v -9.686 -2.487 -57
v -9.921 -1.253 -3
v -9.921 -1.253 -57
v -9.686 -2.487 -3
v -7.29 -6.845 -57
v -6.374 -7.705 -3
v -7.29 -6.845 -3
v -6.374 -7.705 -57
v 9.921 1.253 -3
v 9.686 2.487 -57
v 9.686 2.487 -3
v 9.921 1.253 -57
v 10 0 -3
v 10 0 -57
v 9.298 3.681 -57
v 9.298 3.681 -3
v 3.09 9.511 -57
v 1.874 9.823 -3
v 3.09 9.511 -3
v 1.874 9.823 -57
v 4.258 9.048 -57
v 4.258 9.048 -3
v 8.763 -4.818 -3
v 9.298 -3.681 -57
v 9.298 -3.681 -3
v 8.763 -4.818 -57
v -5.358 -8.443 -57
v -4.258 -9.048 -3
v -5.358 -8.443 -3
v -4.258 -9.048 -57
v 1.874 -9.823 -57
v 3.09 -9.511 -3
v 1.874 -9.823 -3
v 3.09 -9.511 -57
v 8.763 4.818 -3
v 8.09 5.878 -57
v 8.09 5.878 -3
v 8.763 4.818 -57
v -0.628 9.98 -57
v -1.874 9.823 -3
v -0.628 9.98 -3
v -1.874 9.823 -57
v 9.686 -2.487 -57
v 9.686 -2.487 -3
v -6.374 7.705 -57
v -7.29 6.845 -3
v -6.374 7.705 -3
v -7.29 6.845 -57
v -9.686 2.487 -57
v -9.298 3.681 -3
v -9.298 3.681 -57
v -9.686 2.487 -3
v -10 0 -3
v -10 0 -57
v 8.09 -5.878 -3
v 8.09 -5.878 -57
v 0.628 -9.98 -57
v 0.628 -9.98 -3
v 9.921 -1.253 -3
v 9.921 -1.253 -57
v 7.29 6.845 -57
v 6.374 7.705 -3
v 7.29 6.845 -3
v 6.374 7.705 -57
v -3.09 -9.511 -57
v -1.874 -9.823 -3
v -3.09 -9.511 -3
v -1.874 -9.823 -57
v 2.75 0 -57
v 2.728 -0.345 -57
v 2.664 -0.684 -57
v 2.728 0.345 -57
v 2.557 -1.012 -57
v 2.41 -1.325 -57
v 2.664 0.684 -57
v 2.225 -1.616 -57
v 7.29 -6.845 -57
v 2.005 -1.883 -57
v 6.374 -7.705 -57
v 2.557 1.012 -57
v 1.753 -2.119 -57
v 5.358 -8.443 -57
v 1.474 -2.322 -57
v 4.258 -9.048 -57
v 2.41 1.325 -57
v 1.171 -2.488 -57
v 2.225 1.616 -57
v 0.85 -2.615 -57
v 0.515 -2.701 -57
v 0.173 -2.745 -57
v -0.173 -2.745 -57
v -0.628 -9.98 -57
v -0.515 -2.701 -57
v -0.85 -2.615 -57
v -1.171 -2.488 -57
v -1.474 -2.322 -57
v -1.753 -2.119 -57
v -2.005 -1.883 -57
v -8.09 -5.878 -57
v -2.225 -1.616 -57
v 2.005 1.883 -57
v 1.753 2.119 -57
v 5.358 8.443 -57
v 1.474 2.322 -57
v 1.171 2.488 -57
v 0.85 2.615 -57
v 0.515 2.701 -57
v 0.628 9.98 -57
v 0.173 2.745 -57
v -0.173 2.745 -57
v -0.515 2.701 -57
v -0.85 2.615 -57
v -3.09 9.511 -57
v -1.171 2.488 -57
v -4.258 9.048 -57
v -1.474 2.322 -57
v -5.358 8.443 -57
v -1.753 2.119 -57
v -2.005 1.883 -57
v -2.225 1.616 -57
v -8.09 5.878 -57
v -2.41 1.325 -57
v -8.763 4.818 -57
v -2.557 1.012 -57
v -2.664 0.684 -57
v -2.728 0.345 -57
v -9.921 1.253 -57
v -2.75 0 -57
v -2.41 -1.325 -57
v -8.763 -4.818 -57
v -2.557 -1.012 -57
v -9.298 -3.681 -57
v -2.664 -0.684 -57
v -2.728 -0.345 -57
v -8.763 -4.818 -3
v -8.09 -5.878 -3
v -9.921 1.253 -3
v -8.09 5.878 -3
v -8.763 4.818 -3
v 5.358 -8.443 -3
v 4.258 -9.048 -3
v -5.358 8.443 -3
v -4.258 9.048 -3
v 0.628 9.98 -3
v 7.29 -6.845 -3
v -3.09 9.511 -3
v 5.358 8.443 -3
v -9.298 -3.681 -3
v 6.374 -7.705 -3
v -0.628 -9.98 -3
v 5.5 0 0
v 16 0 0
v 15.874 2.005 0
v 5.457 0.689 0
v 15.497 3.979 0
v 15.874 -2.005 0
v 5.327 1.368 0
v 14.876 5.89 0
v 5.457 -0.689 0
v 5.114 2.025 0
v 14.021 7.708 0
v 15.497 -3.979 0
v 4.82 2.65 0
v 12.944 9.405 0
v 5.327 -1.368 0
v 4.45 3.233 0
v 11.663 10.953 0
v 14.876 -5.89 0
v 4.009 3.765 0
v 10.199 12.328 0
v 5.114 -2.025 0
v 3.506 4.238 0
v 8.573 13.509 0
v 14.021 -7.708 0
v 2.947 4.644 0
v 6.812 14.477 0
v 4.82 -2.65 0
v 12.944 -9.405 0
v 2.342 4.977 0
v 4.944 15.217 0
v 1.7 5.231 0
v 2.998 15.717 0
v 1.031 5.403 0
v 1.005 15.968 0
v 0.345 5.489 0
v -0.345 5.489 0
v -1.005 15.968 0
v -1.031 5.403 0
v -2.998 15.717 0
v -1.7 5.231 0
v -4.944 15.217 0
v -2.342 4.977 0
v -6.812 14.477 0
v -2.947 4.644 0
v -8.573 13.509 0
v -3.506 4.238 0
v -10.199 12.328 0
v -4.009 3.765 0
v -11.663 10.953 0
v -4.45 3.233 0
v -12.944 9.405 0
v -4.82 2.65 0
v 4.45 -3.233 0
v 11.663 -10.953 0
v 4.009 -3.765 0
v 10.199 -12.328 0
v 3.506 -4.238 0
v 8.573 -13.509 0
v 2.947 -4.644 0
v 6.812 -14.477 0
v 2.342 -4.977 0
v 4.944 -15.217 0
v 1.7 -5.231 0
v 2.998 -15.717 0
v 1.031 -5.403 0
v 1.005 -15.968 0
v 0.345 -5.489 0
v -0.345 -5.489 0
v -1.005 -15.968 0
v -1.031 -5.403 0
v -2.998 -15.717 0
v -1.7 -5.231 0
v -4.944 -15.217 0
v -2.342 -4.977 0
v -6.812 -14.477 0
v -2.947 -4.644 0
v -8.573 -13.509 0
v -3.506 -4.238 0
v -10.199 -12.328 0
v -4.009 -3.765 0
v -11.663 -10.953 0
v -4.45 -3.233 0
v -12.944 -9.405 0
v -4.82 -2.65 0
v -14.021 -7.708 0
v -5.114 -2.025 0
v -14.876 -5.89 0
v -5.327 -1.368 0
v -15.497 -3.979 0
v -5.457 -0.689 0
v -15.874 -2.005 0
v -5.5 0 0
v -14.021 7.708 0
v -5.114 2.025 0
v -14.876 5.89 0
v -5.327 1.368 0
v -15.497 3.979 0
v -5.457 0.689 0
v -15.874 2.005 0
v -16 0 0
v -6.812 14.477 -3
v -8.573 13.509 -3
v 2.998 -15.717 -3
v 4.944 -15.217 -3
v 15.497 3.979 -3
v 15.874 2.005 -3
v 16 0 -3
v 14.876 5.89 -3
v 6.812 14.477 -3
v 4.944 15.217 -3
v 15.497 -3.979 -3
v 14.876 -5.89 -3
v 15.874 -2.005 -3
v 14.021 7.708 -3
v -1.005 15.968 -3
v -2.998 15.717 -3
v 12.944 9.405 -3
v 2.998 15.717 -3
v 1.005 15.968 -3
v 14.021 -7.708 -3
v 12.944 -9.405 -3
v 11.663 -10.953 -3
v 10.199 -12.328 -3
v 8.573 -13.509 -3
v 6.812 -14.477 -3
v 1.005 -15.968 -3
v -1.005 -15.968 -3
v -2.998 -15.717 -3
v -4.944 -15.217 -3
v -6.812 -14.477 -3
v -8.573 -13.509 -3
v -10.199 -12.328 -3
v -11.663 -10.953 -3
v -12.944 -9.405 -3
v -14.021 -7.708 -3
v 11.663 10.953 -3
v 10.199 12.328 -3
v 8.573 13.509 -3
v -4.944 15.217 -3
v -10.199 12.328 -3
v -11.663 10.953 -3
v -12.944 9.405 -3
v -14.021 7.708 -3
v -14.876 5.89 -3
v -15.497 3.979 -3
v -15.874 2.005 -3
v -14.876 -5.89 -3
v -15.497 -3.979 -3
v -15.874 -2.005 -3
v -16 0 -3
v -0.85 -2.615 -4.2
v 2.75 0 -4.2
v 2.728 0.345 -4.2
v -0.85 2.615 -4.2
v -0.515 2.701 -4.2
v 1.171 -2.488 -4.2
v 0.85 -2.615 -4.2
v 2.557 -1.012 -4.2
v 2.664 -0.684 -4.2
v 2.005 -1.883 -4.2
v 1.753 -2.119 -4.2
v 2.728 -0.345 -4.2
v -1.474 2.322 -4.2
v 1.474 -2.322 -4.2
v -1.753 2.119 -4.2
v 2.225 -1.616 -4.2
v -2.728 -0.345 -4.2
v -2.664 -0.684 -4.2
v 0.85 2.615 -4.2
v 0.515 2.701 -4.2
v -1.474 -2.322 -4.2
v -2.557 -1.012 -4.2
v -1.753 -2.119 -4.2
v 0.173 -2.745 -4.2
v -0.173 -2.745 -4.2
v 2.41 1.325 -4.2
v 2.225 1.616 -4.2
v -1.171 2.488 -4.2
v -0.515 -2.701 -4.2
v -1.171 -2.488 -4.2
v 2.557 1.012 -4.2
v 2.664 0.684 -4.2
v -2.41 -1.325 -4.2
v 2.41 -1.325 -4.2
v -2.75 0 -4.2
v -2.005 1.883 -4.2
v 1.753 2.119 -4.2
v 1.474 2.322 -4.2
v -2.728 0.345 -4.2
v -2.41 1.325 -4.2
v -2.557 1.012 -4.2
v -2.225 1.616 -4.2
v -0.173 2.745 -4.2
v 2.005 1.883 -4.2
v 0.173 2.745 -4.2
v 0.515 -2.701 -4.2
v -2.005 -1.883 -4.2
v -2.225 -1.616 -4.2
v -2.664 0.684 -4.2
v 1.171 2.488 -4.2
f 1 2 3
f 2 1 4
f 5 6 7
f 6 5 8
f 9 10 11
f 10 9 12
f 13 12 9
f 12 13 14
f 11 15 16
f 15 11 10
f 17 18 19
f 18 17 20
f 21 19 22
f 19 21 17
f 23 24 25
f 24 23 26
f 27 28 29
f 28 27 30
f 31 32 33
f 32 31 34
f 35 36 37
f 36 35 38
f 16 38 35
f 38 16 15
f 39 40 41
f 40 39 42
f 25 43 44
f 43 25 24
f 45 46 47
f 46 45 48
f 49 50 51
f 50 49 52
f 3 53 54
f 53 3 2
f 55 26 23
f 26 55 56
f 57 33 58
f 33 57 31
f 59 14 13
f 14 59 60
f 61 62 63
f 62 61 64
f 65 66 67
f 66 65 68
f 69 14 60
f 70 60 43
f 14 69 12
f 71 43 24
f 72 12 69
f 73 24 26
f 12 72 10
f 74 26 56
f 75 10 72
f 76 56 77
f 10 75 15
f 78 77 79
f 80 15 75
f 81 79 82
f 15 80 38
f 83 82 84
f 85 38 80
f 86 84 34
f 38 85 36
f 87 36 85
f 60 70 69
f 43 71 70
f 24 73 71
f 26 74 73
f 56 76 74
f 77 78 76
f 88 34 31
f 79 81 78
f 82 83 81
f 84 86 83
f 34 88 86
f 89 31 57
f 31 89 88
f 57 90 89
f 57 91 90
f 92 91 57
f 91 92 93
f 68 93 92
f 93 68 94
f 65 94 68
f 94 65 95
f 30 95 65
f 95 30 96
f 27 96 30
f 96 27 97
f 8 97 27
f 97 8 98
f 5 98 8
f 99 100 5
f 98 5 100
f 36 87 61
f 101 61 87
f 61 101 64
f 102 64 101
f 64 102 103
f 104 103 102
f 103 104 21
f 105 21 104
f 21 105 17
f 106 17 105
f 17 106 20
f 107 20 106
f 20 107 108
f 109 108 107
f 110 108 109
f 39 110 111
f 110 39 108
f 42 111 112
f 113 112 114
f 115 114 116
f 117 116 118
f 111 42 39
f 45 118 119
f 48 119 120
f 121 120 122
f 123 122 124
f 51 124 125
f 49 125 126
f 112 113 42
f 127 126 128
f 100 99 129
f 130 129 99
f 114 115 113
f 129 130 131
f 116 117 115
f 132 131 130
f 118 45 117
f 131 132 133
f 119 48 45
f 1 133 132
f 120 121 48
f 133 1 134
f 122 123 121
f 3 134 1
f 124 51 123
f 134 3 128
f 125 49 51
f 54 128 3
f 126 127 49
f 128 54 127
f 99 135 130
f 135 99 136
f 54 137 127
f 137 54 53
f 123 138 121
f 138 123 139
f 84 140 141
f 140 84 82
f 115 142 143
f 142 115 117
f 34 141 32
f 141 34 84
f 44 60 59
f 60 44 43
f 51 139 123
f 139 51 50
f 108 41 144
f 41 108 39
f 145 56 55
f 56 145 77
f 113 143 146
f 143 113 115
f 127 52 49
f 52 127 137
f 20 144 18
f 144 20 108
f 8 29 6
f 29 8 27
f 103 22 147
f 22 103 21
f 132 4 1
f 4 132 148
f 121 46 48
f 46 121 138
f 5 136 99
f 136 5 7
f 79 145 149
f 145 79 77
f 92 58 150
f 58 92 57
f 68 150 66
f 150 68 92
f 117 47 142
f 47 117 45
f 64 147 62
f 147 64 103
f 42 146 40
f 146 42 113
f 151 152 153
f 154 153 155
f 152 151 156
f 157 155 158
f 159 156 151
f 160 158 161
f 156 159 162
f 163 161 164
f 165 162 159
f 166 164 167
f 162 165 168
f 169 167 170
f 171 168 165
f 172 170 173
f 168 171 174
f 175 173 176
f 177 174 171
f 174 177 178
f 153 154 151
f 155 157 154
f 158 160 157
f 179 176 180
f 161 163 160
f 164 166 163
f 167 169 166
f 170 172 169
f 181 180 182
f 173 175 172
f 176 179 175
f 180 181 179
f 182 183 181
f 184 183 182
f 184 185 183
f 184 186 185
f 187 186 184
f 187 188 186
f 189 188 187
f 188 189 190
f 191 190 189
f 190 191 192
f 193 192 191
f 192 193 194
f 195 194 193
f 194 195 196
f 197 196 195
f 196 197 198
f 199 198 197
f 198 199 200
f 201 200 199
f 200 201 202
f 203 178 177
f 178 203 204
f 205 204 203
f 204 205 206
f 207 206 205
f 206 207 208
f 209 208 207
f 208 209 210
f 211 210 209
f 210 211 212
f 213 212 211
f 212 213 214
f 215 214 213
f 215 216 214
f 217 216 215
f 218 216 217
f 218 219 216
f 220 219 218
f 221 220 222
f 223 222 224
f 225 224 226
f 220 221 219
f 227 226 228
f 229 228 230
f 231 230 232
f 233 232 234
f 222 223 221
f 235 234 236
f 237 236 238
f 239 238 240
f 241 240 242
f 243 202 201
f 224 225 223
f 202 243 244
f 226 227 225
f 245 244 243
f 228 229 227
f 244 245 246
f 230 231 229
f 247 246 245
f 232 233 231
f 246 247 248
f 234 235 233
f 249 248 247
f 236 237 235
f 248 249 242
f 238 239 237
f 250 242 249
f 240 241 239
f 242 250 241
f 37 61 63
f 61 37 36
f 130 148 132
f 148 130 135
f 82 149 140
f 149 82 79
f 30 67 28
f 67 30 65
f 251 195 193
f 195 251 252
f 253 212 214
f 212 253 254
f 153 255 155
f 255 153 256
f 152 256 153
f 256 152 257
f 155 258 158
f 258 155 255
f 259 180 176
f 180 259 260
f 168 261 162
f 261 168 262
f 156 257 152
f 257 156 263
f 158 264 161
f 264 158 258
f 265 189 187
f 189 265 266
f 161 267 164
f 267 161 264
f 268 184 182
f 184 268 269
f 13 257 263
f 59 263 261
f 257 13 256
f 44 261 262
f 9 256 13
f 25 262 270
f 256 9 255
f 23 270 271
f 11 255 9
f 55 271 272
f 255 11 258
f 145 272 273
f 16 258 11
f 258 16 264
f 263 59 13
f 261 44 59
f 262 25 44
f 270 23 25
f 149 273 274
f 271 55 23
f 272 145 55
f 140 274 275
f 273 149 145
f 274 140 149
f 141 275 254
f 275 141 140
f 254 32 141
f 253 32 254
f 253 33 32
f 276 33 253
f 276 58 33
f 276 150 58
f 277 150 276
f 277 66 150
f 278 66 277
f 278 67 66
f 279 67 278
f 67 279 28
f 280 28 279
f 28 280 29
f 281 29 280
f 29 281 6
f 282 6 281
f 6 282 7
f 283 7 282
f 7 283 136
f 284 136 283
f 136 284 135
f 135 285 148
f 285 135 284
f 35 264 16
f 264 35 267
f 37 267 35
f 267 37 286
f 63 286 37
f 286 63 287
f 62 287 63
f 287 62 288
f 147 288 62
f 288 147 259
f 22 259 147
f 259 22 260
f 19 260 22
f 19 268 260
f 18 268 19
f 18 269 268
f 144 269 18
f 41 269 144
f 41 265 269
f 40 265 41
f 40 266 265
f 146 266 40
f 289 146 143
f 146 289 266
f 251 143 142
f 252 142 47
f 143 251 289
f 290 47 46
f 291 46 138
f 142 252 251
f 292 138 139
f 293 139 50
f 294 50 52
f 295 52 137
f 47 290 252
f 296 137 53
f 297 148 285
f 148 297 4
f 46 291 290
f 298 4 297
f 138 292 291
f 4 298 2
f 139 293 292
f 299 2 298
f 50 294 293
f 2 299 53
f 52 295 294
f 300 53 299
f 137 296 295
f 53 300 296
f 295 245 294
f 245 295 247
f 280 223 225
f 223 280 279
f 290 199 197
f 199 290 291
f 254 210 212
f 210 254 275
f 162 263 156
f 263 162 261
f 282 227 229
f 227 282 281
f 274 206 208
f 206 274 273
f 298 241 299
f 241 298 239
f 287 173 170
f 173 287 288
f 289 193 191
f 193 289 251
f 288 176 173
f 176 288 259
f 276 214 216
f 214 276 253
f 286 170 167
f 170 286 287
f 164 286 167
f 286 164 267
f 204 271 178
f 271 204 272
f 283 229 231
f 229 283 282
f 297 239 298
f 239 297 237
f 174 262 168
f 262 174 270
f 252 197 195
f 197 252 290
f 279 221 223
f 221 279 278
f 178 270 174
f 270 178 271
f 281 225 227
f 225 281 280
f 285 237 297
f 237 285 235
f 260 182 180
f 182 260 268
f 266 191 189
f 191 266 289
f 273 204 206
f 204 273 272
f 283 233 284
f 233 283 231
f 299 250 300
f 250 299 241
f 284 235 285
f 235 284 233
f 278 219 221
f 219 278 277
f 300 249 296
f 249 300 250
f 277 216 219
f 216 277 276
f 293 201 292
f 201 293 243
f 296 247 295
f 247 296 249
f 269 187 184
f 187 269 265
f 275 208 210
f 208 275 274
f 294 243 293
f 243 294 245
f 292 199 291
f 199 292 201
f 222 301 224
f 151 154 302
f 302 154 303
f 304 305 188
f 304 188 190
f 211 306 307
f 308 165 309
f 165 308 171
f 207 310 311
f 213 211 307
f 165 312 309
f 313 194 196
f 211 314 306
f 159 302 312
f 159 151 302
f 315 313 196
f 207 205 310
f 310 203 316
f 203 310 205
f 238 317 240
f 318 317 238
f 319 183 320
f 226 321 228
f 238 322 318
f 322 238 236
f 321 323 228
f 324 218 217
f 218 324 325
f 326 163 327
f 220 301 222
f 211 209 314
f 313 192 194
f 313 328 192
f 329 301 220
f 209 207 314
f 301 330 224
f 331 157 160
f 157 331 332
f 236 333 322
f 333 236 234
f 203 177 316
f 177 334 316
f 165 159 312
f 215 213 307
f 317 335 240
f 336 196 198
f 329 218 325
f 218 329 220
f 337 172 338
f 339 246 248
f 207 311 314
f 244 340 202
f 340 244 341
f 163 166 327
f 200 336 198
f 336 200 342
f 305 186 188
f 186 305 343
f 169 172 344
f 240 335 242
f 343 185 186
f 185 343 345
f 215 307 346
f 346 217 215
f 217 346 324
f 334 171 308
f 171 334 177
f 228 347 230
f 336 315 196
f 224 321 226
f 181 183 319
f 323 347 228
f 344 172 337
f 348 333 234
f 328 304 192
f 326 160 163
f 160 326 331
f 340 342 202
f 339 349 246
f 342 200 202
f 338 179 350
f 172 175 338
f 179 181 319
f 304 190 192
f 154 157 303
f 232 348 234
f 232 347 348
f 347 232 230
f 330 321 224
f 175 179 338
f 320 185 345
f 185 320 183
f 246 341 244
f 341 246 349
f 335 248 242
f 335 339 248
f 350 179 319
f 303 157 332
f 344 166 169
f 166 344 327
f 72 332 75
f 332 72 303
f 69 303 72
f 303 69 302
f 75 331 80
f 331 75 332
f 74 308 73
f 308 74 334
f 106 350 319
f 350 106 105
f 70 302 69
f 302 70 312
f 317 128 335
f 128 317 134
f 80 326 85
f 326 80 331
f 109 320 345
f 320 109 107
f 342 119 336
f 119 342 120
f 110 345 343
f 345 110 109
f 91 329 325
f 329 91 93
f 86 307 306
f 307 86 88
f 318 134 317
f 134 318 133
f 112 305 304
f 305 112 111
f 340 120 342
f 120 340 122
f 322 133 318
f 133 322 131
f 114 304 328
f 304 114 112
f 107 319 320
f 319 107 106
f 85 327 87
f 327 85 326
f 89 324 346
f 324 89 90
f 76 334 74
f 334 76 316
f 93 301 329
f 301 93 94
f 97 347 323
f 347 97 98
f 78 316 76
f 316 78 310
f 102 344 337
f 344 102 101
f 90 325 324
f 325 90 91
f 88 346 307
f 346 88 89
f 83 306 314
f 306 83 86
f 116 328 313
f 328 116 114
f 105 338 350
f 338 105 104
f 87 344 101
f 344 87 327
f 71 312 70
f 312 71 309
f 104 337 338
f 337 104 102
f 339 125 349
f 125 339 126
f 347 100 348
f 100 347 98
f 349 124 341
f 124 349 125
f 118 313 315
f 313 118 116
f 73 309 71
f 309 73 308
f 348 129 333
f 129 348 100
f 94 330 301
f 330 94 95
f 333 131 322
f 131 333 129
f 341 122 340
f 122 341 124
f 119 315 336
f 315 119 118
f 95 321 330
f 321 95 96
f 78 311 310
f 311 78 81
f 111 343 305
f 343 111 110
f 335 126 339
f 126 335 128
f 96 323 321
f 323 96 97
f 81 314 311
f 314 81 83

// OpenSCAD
$fn = 50;


difference() {
	union() {
		translate(v = [0, 0, -57.0000000000]) {
			cylinder(h = 57, r = 10.0000000000);
		}
		translate(v = [0, 0, -3.0000000000]) {
			cylinder(h = 3, r = 16.0000000000);
		}
	}
	union() {
		translate(v = [0, 0, 0]) {
			rotate(a = [0, 0, 0]) {
				difference() {
					union() {
						#translate(v = [0, 0, -57.0000000000]) {
							cylinder(h = 57, r = 2.2500000000);
						}
						#translate(v = [0, 0, -4.2000000000]) {
							cylinder(h = 4.2000000000, r1 = 2.7500000000, r2 = 5.5000000000);
						}
						#translate(v = [0, 0, -57.0000000000]) {
							cylinder(h = 57, r = 2.7500000000);
						}
						#translate(v = [0, 0, -57.0000000000]) {
							cylinder(h = 57, r = 2.2500000000);
						}
					}
					union();
				}
			}
		}
	}
}
